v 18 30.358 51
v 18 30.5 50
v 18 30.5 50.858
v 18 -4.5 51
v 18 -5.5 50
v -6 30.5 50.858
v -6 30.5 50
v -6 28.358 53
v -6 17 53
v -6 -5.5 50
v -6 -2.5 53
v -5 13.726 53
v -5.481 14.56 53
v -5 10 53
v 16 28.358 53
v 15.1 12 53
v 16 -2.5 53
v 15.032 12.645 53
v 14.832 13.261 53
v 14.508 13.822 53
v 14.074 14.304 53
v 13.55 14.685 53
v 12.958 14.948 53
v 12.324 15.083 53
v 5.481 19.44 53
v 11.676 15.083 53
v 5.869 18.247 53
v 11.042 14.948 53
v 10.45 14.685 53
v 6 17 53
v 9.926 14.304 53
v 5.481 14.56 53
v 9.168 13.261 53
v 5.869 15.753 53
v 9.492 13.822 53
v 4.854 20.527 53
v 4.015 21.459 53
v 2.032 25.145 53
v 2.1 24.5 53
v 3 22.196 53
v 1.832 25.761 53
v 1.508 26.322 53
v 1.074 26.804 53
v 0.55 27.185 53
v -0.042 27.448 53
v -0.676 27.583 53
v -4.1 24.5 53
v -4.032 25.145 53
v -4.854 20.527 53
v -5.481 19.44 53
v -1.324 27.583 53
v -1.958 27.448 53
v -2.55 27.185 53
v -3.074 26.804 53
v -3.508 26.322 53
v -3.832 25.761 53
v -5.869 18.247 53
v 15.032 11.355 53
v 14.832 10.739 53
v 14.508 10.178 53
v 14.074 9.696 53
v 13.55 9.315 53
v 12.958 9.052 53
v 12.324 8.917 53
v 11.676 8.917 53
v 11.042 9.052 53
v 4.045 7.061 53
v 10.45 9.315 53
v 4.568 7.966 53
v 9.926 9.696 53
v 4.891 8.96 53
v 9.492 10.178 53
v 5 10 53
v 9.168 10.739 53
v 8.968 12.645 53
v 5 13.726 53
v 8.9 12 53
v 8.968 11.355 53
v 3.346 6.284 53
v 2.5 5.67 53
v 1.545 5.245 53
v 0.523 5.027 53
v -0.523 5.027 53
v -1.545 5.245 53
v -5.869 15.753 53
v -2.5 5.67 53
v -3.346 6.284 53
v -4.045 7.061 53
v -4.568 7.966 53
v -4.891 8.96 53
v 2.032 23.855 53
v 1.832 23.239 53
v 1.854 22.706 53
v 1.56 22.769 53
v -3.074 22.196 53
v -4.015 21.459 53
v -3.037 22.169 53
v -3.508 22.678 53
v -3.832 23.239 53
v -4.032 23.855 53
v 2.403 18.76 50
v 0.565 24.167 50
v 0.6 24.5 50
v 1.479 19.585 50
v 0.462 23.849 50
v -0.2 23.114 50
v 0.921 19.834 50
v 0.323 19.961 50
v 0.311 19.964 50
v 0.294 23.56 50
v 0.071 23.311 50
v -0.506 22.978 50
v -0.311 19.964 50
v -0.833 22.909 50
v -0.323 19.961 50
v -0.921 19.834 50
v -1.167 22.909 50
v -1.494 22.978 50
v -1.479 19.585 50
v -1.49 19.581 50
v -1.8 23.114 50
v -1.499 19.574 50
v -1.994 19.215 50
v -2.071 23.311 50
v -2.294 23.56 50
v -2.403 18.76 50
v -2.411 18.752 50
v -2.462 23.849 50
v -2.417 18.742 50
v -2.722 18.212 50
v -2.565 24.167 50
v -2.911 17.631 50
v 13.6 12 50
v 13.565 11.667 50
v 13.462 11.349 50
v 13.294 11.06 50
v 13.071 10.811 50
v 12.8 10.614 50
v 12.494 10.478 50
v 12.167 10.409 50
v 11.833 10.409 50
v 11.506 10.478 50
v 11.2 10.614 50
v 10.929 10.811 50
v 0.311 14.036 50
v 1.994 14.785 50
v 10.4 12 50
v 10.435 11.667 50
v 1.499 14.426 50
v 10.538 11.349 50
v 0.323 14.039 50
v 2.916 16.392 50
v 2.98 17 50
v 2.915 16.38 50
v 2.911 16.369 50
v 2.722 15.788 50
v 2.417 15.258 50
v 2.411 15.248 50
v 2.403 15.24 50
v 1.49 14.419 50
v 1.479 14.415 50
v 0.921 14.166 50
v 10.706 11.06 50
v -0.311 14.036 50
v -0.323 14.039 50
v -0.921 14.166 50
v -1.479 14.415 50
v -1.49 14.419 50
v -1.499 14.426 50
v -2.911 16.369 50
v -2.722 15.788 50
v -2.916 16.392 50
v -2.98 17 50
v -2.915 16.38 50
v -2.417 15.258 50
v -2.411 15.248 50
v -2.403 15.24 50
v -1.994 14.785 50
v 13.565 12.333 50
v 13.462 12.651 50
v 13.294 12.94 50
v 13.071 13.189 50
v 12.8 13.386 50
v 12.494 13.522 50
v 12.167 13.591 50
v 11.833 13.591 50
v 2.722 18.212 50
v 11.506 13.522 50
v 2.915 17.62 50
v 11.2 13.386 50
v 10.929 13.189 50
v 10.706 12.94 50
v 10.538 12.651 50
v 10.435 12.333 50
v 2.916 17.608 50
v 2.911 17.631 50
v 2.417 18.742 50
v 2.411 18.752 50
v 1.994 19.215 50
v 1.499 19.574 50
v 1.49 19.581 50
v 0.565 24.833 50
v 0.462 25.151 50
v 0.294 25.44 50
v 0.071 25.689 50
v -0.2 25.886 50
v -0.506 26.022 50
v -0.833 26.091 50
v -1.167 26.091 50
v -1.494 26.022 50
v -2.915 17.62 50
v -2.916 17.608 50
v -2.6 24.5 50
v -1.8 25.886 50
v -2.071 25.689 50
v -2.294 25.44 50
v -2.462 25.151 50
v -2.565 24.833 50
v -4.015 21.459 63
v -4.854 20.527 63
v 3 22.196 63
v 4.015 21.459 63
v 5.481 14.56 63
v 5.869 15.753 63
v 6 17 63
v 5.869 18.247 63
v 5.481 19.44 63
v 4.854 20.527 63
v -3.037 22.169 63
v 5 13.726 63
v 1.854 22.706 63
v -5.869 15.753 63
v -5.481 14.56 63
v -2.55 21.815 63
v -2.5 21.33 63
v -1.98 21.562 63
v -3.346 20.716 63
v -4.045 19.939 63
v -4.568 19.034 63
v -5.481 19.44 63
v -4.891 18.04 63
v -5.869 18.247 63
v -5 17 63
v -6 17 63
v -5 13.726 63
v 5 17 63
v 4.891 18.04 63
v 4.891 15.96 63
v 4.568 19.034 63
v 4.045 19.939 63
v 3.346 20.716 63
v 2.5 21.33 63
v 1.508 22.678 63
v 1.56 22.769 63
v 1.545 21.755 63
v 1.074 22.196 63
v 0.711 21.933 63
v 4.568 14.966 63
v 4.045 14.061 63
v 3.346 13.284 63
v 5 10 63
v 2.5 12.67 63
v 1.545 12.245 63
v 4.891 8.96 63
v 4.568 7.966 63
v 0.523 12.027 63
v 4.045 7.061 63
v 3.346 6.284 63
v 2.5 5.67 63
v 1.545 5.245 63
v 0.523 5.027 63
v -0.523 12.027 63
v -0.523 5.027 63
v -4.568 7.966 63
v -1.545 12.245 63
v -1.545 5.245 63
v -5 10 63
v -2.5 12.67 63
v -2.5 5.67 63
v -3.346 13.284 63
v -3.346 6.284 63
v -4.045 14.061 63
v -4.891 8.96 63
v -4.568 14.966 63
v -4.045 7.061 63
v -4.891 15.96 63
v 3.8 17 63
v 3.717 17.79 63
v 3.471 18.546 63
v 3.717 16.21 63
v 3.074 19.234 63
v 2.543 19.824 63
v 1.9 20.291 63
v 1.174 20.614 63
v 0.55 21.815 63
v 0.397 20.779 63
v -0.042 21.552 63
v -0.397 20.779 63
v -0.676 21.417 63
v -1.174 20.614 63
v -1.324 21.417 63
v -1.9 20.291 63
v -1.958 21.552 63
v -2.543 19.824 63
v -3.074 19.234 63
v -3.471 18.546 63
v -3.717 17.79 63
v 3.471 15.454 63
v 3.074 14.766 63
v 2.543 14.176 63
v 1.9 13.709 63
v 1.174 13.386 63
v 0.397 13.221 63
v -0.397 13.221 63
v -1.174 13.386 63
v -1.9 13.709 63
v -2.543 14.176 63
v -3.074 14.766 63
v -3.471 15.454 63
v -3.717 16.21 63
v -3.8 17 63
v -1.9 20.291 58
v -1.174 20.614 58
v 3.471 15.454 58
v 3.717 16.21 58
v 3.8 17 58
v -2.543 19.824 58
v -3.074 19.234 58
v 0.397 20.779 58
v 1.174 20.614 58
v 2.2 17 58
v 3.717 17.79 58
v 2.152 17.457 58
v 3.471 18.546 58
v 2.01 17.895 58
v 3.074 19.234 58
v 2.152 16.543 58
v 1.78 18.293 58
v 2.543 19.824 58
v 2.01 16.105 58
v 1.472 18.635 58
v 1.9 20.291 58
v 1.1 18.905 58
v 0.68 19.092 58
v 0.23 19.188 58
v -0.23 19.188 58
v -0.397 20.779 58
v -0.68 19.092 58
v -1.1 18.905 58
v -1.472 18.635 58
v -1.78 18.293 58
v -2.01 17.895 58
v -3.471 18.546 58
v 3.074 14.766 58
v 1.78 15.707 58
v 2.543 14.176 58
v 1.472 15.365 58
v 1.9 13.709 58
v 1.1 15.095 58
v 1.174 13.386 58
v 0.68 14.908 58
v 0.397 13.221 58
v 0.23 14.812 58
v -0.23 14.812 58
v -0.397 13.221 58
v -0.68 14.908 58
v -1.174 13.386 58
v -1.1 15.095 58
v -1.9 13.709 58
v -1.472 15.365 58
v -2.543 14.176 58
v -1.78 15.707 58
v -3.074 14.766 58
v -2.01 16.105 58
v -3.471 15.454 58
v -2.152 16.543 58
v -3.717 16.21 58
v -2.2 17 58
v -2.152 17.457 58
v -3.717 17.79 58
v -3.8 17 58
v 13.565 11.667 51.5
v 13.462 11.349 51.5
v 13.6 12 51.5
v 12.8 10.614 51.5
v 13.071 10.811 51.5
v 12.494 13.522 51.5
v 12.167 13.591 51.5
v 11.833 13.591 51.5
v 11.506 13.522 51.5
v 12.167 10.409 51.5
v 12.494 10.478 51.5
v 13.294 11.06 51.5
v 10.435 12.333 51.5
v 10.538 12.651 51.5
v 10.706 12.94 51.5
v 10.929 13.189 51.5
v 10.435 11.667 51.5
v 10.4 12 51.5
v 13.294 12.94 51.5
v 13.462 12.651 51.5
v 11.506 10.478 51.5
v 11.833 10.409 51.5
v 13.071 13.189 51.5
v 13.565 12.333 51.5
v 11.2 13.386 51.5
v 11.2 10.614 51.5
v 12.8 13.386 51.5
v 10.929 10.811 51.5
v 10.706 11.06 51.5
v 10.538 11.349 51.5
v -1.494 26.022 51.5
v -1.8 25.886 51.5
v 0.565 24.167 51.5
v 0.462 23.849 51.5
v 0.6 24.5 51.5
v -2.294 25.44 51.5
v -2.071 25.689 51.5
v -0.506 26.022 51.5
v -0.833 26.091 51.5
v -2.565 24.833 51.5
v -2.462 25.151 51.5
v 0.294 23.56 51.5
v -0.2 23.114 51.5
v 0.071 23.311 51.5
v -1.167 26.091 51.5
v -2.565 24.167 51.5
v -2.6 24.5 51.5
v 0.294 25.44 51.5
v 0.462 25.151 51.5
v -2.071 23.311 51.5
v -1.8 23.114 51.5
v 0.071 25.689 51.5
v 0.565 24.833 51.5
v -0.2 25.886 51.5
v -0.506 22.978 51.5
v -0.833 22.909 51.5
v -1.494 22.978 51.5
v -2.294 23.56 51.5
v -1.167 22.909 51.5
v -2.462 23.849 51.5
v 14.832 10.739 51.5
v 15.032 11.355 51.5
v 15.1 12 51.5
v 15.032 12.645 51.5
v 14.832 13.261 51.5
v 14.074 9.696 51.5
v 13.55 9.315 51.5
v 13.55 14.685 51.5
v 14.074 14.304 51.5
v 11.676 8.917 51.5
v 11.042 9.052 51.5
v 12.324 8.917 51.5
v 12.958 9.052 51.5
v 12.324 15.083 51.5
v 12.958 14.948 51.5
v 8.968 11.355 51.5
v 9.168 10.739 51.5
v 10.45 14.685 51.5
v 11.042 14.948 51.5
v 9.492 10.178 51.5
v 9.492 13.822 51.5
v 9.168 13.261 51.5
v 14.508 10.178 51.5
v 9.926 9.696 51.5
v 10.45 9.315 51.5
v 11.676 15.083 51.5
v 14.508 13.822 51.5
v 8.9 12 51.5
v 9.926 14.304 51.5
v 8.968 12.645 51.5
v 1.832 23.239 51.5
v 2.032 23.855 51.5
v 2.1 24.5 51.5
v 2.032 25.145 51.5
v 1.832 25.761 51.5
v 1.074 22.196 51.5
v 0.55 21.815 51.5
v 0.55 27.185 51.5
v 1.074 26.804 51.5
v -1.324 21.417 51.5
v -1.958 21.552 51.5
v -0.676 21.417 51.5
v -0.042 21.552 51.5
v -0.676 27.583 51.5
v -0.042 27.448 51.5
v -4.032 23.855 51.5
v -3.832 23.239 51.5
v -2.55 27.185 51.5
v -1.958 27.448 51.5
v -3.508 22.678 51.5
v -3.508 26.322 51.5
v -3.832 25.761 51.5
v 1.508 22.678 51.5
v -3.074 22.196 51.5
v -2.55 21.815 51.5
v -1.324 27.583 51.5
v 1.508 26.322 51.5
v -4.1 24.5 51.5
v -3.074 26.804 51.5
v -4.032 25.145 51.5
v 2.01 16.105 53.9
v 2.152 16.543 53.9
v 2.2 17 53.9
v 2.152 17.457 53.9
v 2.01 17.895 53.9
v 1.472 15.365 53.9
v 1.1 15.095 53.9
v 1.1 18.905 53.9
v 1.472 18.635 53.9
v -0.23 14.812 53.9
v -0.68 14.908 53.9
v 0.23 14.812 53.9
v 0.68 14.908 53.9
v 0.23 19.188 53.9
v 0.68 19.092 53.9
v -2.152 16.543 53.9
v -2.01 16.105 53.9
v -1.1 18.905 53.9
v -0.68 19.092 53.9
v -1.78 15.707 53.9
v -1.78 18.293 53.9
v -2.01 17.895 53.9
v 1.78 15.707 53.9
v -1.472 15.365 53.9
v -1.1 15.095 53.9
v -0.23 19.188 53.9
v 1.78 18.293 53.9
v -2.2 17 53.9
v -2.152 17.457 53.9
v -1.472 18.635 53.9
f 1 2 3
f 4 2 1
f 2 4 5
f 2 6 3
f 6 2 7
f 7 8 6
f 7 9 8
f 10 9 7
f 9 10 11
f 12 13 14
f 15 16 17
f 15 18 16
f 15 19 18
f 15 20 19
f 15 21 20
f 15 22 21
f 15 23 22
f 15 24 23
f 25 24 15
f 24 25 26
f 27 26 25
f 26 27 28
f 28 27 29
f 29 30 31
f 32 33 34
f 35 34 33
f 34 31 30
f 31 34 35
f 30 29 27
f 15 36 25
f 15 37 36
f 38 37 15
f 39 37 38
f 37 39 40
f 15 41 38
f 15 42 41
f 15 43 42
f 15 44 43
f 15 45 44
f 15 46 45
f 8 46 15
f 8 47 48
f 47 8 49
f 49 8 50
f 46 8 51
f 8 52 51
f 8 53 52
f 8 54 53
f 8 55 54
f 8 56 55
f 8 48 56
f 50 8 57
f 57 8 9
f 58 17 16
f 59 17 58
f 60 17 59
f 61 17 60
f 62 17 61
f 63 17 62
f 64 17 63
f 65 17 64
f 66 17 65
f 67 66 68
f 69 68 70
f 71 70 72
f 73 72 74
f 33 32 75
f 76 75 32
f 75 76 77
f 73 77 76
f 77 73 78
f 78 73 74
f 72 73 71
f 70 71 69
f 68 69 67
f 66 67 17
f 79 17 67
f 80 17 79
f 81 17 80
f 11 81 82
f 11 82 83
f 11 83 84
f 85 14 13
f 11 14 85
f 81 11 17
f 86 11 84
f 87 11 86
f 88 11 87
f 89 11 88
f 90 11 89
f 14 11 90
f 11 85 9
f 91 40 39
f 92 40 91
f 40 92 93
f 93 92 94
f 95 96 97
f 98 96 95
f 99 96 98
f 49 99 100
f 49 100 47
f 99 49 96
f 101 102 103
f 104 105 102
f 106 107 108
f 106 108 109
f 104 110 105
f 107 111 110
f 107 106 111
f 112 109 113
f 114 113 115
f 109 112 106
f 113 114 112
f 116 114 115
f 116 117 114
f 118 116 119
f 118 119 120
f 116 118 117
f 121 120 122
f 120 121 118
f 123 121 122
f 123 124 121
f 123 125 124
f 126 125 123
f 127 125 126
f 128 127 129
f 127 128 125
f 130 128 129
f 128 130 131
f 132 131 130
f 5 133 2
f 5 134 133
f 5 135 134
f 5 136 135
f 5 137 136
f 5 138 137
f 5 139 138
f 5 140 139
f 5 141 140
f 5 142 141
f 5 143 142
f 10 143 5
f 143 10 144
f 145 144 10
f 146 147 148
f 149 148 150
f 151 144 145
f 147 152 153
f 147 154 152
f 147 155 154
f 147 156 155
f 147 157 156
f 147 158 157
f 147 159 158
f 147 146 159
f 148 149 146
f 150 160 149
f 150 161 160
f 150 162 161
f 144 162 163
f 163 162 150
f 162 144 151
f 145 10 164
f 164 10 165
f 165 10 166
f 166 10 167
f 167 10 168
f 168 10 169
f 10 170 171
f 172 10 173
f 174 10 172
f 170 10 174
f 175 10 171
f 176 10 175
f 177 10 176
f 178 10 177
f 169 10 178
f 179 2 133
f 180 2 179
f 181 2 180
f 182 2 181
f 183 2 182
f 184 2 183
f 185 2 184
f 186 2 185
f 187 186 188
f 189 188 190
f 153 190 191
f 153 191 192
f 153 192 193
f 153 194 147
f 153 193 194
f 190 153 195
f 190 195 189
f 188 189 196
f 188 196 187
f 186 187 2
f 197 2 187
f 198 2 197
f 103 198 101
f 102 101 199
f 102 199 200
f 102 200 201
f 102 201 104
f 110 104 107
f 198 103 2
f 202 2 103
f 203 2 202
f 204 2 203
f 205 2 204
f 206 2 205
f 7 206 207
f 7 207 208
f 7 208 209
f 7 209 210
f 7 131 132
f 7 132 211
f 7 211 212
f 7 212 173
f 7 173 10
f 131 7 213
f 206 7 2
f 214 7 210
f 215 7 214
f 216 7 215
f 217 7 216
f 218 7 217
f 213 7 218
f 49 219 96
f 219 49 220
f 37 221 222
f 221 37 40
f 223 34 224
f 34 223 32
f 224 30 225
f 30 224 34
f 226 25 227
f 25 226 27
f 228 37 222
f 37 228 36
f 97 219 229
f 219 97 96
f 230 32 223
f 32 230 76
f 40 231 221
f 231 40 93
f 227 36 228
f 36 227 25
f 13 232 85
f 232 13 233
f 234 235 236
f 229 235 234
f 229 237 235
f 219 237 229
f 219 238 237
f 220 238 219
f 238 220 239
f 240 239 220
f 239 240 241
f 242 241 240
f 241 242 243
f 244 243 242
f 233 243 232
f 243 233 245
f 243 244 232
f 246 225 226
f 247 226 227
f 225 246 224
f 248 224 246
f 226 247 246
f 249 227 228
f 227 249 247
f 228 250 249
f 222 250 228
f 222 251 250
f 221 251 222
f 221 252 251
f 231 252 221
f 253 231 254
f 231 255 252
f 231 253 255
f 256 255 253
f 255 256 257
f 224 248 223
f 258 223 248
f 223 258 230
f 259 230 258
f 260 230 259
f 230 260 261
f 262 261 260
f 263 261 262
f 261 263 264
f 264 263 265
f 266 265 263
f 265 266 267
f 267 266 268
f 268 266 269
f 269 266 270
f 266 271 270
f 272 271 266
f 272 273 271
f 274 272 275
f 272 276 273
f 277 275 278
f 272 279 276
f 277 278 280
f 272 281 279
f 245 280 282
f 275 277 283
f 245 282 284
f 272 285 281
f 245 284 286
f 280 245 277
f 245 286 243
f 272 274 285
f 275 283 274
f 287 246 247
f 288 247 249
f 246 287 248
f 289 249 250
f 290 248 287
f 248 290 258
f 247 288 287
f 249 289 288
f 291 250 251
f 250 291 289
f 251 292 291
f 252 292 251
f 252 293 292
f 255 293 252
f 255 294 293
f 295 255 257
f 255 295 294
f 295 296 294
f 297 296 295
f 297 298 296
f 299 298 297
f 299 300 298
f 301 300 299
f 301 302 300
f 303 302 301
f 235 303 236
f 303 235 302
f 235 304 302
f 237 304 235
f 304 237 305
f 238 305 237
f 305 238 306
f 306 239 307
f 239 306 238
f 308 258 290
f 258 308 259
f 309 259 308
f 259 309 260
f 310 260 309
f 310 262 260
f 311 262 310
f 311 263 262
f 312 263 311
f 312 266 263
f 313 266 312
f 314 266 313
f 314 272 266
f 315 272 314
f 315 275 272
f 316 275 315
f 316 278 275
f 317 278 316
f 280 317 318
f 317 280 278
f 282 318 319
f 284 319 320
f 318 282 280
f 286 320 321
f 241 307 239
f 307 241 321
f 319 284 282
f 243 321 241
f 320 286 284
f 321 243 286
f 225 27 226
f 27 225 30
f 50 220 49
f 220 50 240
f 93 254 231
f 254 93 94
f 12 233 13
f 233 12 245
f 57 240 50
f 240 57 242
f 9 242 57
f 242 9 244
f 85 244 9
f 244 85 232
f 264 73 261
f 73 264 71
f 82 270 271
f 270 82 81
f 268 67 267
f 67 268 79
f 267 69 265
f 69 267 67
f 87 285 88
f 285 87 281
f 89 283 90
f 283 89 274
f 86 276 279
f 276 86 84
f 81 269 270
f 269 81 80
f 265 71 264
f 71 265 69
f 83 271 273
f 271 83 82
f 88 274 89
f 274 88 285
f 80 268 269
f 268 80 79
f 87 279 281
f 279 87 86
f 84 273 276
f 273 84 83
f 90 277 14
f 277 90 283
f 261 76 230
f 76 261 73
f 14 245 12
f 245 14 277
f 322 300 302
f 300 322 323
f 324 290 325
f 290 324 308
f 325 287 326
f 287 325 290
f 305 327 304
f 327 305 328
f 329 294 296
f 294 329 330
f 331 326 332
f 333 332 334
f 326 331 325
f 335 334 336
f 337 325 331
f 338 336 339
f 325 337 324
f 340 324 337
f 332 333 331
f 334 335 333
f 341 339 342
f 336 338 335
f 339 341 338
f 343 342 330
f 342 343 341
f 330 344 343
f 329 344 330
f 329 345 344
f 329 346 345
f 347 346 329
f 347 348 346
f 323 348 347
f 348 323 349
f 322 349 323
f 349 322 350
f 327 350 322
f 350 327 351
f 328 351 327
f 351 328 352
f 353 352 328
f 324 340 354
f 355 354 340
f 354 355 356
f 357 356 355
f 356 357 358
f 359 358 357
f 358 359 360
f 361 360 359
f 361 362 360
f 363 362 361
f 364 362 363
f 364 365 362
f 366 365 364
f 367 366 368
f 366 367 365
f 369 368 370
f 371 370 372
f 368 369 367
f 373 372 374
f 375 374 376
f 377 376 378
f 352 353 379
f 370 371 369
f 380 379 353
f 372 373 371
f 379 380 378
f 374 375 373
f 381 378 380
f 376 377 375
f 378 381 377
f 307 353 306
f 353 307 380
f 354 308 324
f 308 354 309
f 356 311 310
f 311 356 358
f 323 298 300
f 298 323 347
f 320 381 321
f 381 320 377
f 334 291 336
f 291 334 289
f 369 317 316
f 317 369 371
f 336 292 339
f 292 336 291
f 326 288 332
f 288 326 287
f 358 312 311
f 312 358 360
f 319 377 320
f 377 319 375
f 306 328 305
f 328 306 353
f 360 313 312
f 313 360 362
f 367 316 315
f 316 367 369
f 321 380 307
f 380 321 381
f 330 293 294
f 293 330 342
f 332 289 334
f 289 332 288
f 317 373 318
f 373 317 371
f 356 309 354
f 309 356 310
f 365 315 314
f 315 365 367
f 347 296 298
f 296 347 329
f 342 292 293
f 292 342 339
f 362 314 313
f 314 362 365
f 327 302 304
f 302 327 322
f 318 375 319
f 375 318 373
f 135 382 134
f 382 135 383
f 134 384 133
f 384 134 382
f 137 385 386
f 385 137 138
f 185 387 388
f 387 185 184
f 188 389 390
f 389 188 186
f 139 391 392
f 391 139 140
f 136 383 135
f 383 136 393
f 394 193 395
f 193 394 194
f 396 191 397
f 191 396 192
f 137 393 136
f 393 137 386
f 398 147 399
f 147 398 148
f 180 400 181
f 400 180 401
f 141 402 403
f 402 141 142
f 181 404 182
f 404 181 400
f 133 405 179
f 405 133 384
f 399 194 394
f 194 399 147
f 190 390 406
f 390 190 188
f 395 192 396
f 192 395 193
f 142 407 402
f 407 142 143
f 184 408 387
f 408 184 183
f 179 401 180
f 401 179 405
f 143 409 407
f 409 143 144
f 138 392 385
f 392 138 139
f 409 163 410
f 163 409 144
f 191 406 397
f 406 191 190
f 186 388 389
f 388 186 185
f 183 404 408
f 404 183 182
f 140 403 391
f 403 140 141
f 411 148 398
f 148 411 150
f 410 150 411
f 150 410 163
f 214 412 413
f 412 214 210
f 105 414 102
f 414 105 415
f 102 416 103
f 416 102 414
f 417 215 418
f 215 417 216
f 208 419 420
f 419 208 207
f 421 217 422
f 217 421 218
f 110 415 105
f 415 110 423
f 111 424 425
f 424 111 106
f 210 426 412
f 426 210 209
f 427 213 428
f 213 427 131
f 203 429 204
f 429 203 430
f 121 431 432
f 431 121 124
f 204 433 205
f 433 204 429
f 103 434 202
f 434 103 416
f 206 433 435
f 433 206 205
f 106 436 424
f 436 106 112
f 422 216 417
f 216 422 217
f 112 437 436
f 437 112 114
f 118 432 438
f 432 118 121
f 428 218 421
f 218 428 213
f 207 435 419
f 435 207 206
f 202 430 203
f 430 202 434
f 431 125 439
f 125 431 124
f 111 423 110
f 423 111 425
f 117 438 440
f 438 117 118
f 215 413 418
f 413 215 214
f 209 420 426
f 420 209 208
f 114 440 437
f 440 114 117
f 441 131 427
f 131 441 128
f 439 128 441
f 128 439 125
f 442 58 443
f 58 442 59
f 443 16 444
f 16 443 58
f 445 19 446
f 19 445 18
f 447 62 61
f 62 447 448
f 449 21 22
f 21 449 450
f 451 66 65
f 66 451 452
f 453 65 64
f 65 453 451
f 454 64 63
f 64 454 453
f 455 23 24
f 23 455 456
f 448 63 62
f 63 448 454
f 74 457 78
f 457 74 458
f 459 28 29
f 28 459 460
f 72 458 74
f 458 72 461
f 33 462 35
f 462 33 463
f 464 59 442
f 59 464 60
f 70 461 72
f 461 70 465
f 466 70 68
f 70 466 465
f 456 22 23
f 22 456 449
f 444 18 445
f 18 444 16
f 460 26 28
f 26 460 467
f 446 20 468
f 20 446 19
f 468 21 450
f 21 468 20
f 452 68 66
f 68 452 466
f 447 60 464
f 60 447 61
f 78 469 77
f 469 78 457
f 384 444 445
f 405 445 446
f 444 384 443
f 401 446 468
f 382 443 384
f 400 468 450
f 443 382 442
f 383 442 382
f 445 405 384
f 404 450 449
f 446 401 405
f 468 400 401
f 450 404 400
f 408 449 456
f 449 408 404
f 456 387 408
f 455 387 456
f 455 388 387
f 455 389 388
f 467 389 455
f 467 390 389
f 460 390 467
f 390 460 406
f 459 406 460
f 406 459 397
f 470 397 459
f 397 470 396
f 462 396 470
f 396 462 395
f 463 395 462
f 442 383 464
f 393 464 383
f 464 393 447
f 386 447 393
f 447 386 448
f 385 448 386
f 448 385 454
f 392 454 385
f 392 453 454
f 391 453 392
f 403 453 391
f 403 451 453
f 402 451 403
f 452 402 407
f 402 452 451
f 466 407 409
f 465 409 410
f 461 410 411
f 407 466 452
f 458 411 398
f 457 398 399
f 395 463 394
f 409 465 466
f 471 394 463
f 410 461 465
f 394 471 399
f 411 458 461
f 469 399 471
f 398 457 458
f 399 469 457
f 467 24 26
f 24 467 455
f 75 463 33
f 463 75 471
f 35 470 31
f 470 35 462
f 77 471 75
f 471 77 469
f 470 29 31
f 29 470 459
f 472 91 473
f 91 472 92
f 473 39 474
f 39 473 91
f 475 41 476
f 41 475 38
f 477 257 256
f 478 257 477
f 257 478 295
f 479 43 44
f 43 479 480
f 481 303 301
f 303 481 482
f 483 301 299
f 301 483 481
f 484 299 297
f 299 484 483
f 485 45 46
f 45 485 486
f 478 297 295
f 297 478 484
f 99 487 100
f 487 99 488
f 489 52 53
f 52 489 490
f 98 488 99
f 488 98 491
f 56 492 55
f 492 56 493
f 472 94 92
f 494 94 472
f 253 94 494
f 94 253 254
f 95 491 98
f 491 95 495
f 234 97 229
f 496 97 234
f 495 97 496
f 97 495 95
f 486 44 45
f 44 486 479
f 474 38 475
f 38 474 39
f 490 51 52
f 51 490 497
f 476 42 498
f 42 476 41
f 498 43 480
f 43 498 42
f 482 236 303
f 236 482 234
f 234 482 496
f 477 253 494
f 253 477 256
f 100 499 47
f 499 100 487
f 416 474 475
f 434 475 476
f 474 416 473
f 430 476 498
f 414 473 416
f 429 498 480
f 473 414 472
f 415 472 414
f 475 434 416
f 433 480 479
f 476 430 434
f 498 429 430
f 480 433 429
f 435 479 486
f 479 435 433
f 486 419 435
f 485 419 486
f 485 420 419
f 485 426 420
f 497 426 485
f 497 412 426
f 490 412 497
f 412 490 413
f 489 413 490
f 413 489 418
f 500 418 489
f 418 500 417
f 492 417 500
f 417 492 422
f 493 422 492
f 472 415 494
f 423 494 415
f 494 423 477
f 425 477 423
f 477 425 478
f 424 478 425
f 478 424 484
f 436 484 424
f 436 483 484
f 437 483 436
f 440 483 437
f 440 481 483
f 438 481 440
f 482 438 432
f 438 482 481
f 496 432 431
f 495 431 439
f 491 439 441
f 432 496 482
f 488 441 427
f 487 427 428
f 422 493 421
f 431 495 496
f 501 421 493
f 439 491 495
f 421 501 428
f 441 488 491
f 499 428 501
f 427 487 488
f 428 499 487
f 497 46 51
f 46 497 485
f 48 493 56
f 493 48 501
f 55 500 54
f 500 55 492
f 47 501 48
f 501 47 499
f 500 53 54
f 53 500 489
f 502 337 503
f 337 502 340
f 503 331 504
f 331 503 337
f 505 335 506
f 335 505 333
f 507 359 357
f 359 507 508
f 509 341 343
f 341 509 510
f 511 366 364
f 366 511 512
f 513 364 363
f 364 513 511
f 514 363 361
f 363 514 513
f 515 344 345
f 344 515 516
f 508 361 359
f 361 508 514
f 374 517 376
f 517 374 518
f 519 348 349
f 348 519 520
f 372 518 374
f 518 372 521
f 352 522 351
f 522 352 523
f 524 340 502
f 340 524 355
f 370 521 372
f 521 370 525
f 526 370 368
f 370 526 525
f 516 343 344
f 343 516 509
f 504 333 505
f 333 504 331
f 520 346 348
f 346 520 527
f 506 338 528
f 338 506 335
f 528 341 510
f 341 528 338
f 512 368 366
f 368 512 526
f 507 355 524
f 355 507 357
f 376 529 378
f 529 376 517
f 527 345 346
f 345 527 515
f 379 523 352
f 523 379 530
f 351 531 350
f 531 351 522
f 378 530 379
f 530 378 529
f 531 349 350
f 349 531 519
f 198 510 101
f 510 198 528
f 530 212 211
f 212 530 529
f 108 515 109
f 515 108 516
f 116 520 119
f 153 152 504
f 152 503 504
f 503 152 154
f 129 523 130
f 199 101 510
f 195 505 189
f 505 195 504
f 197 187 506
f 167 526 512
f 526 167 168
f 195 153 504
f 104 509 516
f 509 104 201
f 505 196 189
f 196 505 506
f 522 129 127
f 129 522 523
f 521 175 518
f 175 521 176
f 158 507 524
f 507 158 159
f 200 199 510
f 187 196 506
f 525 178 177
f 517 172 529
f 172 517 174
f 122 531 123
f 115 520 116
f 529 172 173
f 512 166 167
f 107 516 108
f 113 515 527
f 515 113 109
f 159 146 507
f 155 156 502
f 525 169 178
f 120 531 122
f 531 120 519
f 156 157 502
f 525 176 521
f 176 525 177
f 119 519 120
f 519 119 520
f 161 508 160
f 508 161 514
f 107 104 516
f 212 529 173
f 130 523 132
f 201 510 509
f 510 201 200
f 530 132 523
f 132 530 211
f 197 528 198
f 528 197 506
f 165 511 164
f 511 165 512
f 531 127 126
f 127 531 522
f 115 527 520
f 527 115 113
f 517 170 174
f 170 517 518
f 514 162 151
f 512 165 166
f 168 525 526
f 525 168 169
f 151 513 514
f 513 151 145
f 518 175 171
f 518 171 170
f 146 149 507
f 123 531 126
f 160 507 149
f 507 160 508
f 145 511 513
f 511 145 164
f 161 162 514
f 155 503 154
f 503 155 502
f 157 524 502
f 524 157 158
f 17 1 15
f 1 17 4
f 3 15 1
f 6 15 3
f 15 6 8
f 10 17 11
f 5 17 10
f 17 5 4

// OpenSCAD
// PRUSA iteration4
// Filament sensor cover
// GNU GPL v3
// Josef Průša <iam@josefprusa.cz> and contributors
// http://www.reprap.org/wiki/Prusa_Mendel
// http://prusamendel.org

module part()
{
    difference()
    {
        union()
            {   
                // base shape
                translate([-6,50,-30.5]) cube([24,3,36]);
                translate([0,63,-17]) rotate([90,0,0]) cylinder(r=6,h = 13, $fn=30); 
                translate([0,63,-10]) rotate([90,0,0]) cylinder(r=5,h = 13, $fn=30); 
                
                translate([-5,50,-17]) cube([10,13,7]);
              
            }
            
            // brass insert hole
            translate([0,63.5,-17]) rotate([90,0,0]) cylinder(r=3.8,h = 5.5, $fn=30); 
            translate([0,65,-17]) rotate([90,0,0]) cylinder(r=5,h = 2, $fn=30); 
            
            // mounting screws
            translate([12,60,-12]) rotate([90,0,0]) cylinder(r=1.6,h = 20, $fn=30); 
            translate([-1,60,-24.5]) rotate([90,0,0]) cylinder(r=1.6,h = 20, $fn=30); 
                
            translate([12,54.5,-12]) rotate([90,0,0]) cylinder(r=3.1,h = 3, $fn=30); 
            translate([-1,66.5,-24.5]) rotate([90,0,0]) cylinder(r=3.1,h = 15, $fn=30); 

            // filament guide
            translate([0,59.8,-17]) rotate([90,0,0]) cylinder(r=2.2,h = 9.8, $fn=30); 
            translate([0,61,-17]) rotate([90,0,0]) cylinder(r=1,h = 20, $fn=30);     
            translate([0,62.5,-17]) rotate([90,0,0]) cylinder(r2=1.2, r1=3,h = 3, $fn=30);     
            translate([0,53.9,-17]) rotate([90,0,0]) cylinder(r1=2.2, r2=3,h = 4, $fn=30);     
                
                
            // nice edges    
            translate([19,50,-40]) rotate([0,0,45]) cube([10,10,50]);
            translate([-8,56.5,-39]) rotate([45,0,0]) cube([50,10,10]);
            translate([-8,56.5,-1]) rotate([45,0,0]) cube([50,10,10]);


        //translate([7,50.4,0]) rotate([90,180,0]) linear_extrude(height = 0.6) 
        //{ text("M1",font = "helvetica:style=Bold", size=5, center=true); }
    }
}


rotate([90,0,0]) 
part();
